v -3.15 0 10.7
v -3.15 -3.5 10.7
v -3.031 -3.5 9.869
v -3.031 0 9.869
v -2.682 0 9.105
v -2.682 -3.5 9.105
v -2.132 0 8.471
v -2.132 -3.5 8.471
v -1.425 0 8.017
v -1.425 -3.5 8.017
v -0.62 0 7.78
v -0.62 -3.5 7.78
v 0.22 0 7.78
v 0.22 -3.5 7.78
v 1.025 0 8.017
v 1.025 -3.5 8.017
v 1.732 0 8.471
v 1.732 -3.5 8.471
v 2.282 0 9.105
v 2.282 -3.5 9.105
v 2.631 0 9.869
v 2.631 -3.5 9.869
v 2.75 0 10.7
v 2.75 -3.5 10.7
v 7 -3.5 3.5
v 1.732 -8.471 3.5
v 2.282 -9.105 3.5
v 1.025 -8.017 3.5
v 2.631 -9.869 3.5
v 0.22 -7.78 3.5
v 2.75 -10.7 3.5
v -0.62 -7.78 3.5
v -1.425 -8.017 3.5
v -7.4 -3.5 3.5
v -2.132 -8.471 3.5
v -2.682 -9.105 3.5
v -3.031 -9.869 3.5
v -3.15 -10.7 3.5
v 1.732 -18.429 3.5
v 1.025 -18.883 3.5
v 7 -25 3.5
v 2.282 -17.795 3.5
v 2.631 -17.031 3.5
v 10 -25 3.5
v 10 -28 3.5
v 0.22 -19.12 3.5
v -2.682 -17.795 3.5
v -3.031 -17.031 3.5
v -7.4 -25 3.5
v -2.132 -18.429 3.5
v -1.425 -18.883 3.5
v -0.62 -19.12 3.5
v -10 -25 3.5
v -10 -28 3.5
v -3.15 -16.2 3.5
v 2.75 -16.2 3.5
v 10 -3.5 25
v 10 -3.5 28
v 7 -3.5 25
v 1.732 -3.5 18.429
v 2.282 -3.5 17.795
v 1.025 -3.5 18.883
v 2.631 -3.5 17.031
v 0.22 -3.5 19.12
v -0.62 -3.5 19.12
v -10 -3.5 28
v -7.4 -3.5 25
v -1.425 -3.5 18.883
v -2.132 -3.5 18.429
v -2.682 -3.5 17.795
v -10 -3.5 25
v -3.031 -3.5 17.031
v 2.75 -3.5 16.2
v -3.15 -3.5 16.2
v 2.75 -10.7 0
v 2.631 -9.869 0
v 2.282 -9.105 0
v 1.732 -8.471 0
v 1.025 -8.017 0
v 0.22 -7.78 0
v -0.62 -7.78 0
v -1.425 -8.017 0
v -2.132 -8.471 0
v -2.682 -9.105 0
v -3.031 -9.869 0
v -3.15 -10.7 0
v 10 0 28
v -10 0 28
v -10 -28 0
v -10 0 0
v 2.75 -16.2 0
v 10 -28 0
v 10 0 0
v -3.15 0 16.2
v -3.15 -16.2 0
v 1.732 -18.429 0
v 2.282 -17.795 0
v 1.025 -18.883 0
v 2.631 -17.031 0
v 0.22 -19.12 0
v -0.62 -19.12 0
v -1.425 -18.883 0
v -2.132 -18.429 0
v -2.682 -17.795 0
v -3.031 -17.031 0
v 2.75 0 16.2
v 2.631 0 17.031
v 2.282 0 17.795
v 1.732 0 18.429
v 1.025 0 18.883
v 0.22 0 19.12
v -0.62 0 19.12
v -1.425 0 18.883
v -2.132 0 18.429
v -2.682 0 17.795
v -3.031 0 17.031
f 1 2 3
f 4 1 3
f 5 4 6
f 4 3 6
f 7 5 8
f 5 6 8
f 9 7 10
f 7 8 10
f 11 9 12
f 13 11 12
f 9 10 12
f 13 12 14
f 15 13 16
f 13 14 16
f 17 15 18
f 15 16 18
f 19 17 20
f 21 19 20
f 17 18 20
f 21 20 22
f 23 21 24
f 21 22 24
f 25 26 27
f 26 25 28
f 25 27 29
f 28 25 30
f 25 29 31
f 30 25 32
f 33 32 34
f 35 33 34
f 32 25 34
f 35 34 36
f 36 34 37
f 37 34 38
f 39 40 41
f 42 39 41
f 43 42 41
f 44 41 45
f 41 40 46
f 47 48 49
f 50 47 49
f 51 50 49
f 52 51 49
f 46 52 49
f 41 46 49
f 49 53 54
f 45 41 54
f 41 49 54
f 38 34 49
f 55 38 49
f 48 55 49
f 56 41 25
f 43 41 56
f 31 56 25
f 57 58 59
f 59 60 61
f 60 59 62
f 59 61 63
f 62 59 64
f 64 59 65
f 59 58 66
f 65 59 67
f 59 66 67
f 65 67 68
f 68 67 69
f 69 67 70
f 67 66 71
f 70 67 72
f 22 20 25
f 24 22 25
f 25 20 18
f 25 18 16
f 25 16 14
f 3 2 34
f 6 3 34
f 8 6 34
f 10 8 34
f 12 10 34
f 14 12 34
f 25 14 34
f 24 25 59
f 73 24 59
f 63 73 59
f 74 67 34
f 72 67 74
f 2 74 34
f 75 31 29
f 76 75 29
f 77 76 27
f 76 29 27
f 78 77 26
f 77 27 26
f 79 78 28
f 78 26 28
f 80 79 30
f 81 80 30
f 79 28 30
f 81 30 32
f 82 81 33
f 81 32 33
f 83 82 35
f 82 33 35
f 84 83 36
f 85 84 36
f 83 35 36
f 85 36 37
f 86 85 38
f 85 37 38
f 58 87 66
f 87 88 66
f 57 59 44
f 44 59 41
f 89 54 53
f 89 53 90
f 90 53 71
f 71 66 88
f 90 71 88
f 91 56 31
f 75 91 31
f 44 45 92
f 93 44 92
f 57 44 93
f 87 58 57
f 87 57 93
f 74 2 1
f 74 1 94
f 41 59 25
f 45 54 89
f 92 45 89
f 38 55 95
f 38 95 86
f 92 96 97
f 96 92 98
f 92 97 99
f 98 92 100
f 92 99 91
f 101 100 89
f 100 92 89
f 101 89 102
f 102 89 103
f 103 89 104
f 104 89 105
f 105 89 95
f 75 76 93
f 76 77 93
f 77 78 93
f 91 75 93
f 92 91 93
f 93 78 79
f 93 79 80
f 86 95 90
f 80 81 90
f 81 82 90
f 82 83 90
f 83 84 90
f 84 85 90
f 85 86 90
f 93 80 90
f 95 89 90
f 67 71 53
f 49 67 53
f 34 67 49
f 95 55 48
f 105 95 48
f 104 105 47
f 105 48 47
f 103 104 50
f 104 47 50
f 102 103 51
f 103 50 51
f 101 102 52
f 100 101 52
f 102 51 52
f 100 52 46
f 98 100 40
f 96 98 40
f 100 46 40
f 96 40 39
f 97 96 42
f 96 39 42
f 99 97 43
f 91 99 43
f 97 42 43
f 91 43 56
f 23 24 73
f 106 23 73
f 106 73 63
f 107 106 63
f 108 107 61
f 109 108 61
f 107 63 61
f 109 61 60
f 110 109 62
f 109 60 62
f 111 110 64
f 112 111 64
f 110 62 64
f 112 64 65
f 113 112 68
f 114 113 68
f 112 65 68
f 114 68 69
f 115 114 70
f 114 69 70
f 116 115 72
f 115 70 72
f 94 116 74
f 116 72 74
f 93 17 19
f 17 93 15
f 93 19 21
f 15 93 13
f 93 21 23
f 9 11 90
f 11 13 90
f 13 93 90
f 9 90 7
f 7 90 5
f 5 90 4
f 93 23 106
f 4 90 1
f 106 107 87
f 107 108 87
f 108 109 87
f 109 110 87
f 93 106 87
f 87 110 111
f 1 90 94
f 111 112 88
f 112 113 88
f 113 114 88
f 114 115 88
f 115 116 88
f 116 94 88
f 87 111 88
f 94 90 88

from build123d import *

# Parameters (mm, degrees)
PAD_DEPTH            = 10
BOX_W                = 27
BOX_H                = 24.4
BOX_DEPTH            = 14.4
POCKET_DEPTH         = 3.5
POCKET001_DEPTH      = 4
BODY_ROLL_ANGLE      = 90
BODY_PLACEMENT_ANGLE = -90


with BuildPart() as part:
    # Sketch → Pad (new body, symmetric)
    with BuildSketch(Plane.XY):
        Polygon((0, 0), (0, 28), (3.5, 28), (3.5, 25), (25, 3.5), (28, 3.5), (28, 0), align=None)
    extrude(amount=PAD_DEPTH, both=True)

    # Box → Box (cut)
    with BuildSketch(Plane(origin=(3.5, 3.5, -7), x_dir=(1, 0, 0), z_dir=(0, 0, 1))):
        with Locations((13.5, 12.2)):
            Rectangle(BOX_W, BOX_H)
    extrude(amount=BOX_DEPTH, mode=Mode.SUBTRACT)

    # Sketch001 (on Face17 of Box) → Pocket (cut)
    with BuildSketch(Plane(origin=(3.5, 3.5, -7), x_dir=(0, 1, 0), z_dir=(1, 0, 0))):
        with BuildLine():
            ThreePointArc((7.2, 10.15), (4.25, 7.2), (7.2, 4.25))
            Line((7.2, 4.25), (12.7, 4.25))
            ThreePointArc((12.7, 4.25), (15.65, 7.2), (12.7, 10.15))
            Line((7.2, 10.15), (12.7, 10.15))
        make_face()
    extrude(amount=-POCKET_DEPTH, mode=Mode.SUBTRACT)

    # Sketch002 (on Face21 of Pocket) → Pocket001 (cut)
    with BuildSketch(Plane(origin=(3.5, 3.5, -7), x_dir=(-1, 0, 0), z_dir=(0, 1, 0))):
        with BuildLine():
            ThreePointArc((-12.7, 10.15), (-15.65, 7.2), (-12.7, 4.25))
            Line((-12.7, 4.25), (-7.2, 4.25))
            ThreePointArc((-7.2, 4.25), (-4.25, 7.2), (-7.2, 10.15))
            Line((-12.7, 10.15), (-7.2, 10.15))
        make_face()
    extrude(amount=-POCKET001_DEPTH, mode=Mode.SUBTRACT)


with BuildPart() as part_1:
    # Body roll: moved
    add(part.part.rotate(Axis((0, 0, 0), (1, 0, 0)), BODY_ROLL_ANGLE))


with BuildPart() as part_2:
    # Body placement: moved
    add(part_1.part.rotate(Axis((0, 0, 0), (0, 0, 1)), BODY_PLACEMENT_ANGLE))


solid = part_2.part
